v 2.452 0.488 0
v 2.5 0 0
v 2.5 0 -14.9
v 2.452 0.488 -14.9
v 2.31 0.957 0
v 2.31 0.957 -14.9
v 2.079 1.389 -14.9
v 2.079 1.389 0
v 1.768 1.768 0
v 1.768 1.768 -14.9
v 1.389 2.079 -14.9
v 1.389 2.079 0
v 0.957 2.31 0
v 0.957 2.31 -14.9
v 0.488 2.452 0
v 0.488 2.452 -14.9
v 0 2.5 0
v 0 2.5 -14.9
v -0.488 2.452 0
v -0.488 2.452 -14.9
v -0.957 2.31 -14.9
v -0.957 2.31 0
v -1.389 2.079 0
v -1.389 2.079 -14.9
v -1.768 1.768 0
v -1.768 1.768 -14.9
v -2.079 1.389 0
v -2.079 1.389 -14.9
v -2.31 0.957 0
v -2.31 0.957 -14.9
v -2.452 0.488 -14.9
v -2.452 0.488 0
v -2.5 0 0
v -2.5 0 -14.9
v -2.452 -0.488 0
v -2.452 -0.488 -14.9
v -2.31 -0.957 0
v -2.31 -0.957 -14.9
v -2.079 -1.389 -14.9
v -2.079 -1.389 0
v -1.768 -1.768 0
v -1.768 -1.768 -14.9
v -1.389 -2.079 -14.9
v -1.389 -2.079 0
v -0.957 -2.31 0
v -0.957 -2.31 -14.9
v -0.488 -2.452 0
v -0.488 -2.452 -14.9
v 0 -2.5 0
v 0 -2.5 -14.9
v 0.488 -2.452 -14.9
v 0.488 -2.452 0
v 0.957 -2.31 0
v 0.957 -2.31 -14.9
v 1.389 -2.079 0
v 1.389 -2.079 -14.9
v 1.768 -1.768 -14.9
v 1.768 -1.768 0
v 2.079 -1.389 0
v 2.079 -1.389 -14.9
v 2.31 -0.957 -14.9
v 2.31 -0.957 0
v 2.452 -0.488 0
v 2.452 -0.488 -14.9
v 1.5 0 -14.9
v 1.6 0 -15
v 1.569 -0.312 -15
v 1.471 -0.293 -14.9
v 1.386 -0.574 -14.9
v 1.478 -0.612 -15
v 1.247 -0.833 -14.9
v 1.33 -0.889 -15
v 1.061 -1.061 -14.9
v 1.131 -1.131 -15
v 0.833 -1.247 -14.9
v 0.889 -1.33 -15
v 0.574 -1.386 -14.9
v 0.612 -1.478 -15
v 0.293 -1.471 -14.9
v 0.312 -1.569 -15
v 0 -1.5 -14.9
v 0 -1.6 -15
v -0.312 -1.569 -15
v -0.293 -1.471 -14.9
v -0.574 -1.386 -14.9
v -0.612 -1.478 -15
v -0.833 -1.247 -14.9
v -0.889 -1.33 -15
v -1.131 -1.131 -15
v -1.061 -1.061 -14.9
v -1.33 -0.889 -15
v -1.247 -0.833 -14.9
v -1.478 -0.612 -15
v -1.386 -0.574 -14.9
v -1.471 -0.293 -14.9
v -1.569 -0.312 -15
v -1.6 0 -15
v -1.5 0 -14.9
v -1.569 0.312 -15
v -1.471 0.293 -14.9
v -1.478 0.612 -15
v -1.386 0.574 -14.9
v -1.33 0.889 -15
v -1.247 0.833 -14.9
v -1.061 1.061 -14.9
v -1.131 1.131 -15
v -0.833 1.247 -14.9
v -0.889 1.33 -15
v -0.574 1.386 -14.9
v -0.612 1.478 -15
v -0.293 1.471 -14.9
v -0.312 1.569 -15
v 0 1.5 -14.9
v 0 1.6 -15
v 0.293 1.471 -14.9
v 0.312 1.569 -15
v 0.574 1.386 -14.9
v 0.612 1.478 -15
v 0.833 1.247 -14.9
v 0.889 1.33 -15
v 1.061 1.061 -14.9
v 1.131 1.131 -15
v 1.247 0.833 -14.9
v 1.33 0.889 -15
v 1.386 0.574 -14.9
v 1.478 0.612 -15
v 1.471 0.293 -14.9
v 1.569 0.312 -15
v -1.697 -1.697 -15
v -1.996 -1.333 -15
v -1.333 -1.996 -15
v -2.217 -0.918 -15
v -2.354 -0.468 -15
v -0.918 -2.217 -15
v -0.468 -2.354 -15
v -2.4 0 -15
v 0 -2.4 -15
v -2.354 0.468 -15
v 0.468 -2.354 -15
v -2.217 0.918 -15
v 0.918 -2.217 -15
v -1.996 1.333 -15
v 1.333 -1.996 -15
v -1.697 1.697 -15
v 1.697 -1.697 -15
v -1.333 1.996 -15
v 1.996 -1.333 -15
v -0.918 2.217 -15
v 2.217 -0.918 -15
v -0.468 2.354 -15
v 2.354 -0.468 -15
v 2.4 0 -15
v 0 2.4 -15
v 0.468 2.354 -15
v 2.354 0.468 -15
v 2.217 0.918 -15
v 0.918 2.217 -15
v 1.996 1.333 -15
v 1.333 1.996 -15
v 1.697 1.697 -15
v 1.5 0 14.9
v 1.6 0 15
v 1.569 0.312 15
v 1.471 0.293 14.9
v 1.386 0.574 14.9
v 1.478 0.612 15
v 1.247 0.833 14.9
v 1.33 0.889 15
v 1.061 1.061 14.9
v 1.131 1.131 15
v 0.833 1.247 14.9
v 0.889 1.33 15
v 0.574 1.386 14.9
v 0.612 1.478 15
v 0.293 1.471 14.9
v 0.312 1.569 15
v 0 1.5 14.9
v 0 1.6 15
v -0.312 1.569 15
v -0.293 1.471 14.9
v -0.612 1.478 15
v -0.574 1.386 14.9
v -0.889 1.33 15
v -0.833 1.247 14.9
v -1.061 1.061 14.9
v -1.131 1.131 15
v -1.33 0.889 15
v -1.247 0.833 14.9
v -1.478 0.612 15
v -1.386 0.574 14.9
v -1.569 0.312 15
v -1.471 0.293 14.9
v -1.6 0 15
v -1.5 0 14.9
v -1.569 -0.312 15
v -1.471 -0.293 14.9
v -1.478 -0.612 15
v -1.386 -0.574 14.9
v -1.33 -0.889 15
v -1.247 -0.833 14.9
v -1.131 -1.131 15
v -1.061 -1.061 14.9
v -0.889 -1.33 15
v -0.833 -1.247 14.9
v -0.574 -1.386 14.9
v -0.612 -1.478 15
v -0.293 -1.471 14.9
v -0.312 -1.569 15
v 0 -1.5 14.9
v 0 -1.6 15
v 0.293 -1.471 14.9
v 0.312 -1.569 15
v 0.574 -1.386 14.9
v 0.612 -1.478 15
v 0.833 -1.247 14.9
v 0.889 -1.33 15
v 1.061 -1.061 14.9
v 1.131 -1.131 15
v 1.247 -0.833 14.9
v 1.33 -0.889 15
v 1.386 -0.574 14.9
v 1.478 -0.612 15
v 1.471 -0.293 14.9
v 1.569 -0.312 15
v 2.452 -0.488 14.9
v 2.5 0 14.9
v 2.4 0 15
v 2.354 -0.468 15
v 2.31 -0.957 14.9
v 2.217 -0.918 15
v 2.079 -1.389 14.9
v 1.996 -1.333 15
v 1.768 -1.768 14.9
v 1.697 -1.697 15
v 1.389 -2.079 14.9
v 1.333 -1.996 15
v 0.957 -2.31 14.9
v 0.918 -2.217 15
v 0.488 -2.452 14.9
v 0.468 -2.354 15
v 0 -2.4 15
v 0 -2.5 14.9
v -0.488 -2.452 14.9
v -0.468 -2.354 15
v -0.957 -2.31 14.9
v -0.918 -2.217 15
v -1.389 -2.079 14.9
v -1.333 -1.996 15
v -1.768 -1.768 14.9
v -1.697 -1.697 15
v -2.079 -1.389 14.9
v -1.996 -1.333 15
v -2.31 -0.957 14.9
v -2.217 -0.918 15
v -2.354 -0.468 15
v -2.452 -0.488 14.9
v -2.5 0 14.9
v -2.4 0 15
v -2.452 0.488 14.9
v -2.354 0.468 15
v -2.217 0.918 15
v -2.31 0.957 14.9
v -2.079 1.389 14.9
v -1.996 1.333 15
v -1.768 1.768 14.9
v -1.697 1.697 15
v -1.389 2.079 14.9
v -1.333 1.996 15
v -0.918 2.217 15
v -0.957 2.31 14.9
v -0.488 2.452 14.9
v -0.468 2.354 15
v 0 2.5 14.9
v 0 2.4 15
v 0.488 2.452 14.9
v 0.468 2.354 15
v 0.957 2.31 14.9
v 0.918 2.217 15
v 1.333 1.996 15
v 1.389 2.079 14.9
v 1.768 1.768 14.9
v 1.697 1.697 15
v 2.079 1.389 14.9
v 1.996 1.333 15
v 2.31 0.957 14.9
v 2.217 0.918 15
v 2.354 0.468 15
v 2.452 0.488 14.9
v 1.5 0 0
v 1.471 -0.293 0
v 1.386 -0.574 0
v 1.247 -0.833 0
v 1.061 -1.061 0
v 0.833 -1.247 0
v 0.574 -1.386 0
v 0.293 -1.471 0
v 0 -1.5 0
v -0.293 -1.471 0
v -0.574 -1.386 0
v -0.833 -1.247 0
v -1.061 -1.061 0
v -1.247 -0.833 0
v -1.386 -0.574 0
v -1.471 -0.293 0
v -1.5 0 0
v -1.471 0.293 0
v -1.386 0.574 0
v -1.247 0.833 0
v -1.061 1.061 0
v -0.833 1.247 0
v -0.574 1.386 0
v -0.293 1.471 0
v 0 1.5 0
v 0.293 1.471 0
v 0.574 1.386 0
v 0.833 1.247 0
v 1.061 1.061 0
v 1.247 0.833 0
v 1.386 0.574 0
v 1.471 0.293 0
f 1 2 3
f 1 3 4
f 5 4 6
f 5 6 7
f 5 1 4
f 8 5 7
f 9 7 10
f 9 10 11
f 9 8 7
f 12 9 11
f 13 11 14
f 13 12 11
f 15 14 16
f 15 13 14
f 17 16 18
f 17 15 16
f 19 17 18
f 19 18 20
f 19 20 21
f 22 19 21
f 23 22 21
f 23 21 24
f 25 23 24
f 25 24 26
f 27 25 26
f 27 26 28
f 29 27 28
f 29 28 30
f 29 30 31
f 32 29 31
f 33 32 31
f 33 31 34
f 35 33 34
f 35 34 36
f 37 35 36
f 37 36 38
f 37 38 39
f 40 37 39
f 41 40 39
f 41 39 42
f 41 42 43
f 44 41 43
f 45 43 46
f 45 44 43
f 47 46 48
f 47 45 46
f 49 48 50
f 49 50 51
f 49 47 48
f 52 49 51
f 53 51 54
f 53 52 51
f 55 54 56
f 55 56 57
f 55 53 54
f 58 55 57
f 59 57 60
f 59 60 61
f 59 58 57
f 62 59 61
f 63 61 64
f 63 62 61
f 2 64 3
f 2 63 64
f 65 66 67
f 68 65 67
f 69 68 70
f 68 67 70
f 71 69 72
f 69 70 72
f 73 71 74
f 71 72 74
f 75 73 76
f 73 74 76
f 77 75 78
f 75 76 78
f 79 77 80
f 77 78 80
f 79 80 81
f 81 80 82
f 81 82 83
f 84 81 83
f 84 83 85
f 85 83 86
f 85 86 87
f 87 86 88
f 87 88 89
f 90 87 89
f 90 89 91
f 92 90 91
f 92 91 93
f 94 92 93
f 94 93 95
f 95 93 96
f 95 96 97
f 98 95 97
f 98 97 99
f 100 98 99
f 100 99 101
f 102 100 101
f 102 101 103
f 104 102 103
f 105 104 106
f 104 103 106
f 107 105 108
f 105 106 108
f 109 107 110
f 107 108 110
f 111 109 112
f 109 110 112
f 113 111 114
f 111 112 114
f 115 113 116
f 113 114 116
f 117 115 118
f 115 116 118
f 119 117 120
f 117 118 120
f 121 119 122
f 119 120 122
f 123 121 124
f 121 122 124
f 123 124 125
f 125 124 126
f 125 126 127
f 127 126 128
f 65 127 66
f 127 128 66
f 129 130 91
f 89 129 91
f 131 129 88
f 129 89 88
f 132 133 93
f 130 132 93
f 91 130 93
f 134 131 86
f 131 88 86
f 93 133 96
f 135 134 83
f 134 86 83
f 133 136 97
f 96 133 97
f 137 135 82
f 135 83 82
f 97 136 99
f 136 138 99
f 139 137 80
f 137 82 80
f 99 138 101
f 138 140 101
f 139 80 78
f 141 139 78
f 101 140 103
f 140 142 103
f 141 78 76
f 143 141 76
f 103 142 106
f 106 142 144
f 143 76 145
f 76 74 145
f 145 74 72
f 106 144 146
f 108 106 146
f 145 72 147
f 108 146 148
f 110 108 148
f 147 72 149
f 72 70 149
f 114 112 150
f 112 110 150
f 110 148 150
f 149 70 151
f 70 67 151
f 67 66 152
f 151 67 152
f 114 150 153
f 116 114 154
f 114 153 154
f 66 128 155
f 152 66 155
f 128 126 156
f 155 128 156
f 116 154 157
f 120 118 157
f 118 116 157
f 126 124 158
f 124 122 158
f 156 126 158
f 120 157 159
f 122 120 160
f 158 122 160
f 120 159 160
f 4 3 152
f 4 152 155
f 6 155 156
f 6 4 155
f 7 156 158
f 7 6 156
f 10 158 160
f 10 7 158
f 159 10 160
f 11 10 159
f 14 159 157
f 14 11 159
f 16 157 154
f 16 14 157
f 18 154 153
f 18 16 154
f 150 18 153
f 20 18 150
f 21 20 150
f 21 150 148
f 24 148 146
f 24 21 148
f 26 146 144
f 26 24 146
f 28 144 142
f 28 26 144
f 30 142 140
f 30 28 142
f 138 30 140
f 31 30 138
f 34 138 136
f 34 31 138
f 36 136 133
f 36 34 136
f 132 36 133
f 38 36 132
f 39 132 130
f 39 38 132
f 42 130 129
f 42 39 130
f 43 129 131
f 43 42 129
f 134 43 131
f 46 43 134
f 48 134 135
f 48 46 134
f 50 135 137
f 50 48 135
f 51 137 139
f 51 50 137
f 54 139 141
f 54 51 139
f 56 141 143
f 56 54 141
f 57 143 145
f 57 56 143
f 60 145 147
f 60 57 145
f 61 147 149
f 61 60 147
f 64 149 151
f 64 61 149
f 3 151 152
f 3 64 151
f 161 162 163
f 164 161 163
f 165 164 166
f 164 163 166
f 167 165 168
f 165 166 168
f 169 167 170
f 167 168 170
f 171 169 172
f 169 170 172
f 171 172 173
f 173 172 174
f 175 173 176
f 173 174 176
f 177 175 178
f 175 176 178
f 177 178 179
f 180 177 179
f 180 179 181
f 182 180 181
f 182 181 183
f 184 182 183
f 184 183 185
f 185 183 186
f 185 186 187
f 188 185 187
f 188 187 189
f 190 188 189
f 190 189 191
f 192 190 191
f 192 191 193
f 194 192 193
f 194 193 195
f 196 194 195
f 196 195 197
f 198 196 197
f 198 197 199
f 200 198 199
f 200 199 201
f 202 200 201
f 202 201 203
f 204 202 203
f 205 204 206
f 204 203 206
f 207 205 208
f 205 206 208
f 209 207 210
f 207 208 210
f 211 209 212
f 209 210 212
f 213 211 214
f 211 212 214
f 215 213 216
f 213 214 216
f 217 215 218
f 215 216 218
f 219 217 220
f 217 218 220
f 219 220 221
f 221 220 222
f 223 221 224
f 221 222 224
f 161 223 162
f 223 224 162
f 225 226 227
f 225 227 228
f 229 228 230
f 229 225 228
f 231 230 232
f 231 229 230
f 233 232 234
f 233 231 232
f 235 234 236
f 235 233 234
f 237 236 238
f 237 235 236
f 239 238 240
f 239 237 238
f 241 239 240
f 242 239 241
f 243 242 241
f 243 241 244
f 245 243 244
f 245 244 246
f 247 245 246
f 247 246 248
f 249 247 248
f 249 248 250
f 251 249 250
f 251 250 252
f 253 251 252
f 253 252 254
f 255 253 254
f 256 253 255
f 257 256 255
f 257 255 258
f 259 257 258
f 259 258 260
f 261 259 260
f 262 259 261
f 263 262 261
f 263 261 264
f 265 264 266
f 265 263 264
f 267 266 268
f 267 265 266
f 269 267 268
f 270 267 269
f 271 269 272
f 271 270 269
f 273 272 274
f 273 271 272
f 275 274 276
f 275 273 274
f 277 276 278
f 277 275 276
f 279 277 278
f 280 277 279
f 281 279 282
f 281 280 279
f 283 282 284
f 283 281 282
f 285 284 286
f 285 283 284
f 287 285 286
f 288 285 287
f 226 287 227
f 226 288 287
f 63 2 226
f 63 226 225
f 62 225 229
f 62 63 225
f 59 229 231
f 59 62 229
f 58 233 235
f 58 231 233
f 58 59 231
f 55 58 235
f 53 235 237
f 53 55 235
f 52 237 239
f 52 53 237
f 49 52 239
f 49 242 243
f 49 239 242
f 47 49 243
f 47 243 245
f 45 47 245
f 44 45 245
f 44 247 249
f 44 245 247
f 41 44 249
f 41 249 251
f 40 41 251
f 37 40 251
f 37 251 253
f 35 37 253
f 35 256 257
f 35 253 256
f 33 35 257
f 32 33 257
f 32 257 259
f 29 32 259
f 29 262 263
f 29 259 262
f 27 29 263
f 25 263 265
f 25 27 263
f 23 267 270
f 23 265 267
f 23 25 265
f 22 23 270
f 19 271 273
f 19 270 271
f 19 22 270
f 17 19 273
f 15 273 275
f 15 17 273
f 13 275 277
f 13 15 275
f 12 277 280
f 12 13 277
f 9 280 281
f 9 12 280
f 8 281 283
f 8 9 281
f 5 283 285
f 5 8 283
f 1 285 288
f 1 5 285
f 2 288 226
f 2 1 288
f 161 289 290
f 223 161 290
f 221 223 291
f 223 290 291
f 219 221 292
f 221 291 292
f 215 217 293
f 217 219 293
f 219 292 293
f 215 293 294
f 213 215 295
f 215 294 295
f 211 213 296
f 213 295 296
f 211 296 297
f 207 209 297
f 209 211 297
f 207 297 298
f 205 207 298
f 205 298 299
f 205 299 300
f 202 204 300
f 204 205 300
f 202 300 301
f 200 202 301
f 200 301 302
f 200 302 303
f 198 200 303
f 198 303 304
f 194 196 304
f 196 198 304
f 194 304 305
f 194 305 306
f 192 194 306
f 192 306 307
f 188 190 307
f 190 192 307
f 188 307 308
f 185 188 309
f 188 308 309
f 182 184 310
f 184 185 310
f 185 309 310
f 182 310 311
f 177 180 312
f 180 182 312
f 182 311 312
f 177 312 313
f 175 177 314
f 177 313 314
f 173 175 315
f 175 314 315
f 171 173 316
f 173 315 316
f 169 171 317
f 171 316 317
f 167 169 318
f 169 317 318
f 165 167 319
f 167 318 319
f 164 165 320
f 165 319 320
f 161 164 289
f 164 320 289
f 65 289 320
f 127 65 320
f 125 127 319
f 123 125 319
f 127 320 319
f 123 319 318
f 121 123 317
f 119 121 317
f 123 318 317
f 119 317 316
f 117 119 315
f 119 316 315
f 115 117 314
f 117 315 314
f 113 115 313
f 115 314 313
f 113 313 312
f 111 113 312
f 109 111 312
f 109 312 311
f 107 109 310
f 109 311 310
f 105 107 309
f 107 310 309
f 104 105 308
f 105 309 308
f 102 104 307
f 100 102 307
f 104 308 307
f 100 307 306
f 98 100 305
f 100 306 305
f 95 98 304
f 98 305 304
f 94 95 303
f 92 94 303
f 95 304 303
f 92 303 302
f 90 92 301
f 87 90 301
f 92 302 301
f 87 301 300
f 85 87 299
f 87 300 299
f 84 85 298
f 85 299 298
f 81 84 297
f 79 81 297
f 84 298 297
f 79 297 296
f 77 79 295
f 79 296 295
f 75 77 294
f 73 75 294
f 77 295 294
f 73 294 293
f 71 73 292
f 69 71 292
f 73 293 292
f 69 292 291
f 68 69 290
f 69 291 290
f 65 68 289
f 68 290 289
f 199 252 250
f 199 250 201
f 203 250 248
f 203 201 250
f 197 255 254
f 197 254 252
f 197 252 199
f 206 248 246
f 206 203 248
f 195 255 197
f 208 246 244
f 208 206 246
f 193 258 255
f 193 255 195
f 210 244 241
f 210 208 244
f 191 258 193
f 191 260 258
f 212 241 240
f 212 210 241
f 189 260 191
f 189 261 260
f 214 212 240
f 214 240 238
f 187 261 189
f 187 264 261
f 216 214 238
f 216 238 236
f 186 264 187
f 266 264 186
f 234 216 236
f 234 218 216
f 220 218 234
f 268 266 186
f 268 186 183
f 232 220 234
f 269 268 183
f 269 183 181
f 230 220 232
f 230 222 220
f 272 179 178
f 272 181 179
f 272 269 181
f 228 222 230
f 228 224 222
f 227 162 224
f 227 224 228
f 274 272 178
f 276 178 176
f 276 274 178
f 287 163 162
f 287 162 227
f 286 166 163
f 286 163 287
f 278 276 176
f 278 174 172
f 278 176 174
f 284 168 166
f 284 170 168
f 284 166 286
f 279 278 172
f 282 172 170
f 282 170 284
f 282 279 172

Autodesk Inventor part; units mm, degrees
ref_plane "YZ Plane" through (0, 0, 0) normal (1, 0, 0) x (0, 1, 0)
ref_plane "XZ Plane" through (0, 0, 0) normal (0, 1, 0) x (-1, 0, 0)
ref_plane "XY Plane" through (0, 0, 0) normal (0, 0, 1) x (1, 0, 0)
sketch "Sketch1" plane through (0, 0, 0) normal (0, 0, 1) x (1, 0, 0)
  circle A0 centre (0, 0) radius 2.5
  circle A1 centre (0, 0) radius 1.5
  dimension "d0" = 5
  dimension "d1" = 3
extrude "Extrusion1" add sketch "Sketch1" along normal mid plane 30
thread "Thread1" size "M3x0.5" class "6H" standard "ANSI Metric M Profile" length 10
thread "Thread2" size "M3x0.5" class "6H" standard "ANSI Metric M Profile" length 10
chamfer "Chamfer1" distance 0.1 angle 45 4 edges at (-2.5, 0, 15) (-1.5, 0, 15) (-1.5, 0, -15) (-2.5, 0, -15)
properties part number "M3 30mm Standoff" material "Aluminum 6061"
